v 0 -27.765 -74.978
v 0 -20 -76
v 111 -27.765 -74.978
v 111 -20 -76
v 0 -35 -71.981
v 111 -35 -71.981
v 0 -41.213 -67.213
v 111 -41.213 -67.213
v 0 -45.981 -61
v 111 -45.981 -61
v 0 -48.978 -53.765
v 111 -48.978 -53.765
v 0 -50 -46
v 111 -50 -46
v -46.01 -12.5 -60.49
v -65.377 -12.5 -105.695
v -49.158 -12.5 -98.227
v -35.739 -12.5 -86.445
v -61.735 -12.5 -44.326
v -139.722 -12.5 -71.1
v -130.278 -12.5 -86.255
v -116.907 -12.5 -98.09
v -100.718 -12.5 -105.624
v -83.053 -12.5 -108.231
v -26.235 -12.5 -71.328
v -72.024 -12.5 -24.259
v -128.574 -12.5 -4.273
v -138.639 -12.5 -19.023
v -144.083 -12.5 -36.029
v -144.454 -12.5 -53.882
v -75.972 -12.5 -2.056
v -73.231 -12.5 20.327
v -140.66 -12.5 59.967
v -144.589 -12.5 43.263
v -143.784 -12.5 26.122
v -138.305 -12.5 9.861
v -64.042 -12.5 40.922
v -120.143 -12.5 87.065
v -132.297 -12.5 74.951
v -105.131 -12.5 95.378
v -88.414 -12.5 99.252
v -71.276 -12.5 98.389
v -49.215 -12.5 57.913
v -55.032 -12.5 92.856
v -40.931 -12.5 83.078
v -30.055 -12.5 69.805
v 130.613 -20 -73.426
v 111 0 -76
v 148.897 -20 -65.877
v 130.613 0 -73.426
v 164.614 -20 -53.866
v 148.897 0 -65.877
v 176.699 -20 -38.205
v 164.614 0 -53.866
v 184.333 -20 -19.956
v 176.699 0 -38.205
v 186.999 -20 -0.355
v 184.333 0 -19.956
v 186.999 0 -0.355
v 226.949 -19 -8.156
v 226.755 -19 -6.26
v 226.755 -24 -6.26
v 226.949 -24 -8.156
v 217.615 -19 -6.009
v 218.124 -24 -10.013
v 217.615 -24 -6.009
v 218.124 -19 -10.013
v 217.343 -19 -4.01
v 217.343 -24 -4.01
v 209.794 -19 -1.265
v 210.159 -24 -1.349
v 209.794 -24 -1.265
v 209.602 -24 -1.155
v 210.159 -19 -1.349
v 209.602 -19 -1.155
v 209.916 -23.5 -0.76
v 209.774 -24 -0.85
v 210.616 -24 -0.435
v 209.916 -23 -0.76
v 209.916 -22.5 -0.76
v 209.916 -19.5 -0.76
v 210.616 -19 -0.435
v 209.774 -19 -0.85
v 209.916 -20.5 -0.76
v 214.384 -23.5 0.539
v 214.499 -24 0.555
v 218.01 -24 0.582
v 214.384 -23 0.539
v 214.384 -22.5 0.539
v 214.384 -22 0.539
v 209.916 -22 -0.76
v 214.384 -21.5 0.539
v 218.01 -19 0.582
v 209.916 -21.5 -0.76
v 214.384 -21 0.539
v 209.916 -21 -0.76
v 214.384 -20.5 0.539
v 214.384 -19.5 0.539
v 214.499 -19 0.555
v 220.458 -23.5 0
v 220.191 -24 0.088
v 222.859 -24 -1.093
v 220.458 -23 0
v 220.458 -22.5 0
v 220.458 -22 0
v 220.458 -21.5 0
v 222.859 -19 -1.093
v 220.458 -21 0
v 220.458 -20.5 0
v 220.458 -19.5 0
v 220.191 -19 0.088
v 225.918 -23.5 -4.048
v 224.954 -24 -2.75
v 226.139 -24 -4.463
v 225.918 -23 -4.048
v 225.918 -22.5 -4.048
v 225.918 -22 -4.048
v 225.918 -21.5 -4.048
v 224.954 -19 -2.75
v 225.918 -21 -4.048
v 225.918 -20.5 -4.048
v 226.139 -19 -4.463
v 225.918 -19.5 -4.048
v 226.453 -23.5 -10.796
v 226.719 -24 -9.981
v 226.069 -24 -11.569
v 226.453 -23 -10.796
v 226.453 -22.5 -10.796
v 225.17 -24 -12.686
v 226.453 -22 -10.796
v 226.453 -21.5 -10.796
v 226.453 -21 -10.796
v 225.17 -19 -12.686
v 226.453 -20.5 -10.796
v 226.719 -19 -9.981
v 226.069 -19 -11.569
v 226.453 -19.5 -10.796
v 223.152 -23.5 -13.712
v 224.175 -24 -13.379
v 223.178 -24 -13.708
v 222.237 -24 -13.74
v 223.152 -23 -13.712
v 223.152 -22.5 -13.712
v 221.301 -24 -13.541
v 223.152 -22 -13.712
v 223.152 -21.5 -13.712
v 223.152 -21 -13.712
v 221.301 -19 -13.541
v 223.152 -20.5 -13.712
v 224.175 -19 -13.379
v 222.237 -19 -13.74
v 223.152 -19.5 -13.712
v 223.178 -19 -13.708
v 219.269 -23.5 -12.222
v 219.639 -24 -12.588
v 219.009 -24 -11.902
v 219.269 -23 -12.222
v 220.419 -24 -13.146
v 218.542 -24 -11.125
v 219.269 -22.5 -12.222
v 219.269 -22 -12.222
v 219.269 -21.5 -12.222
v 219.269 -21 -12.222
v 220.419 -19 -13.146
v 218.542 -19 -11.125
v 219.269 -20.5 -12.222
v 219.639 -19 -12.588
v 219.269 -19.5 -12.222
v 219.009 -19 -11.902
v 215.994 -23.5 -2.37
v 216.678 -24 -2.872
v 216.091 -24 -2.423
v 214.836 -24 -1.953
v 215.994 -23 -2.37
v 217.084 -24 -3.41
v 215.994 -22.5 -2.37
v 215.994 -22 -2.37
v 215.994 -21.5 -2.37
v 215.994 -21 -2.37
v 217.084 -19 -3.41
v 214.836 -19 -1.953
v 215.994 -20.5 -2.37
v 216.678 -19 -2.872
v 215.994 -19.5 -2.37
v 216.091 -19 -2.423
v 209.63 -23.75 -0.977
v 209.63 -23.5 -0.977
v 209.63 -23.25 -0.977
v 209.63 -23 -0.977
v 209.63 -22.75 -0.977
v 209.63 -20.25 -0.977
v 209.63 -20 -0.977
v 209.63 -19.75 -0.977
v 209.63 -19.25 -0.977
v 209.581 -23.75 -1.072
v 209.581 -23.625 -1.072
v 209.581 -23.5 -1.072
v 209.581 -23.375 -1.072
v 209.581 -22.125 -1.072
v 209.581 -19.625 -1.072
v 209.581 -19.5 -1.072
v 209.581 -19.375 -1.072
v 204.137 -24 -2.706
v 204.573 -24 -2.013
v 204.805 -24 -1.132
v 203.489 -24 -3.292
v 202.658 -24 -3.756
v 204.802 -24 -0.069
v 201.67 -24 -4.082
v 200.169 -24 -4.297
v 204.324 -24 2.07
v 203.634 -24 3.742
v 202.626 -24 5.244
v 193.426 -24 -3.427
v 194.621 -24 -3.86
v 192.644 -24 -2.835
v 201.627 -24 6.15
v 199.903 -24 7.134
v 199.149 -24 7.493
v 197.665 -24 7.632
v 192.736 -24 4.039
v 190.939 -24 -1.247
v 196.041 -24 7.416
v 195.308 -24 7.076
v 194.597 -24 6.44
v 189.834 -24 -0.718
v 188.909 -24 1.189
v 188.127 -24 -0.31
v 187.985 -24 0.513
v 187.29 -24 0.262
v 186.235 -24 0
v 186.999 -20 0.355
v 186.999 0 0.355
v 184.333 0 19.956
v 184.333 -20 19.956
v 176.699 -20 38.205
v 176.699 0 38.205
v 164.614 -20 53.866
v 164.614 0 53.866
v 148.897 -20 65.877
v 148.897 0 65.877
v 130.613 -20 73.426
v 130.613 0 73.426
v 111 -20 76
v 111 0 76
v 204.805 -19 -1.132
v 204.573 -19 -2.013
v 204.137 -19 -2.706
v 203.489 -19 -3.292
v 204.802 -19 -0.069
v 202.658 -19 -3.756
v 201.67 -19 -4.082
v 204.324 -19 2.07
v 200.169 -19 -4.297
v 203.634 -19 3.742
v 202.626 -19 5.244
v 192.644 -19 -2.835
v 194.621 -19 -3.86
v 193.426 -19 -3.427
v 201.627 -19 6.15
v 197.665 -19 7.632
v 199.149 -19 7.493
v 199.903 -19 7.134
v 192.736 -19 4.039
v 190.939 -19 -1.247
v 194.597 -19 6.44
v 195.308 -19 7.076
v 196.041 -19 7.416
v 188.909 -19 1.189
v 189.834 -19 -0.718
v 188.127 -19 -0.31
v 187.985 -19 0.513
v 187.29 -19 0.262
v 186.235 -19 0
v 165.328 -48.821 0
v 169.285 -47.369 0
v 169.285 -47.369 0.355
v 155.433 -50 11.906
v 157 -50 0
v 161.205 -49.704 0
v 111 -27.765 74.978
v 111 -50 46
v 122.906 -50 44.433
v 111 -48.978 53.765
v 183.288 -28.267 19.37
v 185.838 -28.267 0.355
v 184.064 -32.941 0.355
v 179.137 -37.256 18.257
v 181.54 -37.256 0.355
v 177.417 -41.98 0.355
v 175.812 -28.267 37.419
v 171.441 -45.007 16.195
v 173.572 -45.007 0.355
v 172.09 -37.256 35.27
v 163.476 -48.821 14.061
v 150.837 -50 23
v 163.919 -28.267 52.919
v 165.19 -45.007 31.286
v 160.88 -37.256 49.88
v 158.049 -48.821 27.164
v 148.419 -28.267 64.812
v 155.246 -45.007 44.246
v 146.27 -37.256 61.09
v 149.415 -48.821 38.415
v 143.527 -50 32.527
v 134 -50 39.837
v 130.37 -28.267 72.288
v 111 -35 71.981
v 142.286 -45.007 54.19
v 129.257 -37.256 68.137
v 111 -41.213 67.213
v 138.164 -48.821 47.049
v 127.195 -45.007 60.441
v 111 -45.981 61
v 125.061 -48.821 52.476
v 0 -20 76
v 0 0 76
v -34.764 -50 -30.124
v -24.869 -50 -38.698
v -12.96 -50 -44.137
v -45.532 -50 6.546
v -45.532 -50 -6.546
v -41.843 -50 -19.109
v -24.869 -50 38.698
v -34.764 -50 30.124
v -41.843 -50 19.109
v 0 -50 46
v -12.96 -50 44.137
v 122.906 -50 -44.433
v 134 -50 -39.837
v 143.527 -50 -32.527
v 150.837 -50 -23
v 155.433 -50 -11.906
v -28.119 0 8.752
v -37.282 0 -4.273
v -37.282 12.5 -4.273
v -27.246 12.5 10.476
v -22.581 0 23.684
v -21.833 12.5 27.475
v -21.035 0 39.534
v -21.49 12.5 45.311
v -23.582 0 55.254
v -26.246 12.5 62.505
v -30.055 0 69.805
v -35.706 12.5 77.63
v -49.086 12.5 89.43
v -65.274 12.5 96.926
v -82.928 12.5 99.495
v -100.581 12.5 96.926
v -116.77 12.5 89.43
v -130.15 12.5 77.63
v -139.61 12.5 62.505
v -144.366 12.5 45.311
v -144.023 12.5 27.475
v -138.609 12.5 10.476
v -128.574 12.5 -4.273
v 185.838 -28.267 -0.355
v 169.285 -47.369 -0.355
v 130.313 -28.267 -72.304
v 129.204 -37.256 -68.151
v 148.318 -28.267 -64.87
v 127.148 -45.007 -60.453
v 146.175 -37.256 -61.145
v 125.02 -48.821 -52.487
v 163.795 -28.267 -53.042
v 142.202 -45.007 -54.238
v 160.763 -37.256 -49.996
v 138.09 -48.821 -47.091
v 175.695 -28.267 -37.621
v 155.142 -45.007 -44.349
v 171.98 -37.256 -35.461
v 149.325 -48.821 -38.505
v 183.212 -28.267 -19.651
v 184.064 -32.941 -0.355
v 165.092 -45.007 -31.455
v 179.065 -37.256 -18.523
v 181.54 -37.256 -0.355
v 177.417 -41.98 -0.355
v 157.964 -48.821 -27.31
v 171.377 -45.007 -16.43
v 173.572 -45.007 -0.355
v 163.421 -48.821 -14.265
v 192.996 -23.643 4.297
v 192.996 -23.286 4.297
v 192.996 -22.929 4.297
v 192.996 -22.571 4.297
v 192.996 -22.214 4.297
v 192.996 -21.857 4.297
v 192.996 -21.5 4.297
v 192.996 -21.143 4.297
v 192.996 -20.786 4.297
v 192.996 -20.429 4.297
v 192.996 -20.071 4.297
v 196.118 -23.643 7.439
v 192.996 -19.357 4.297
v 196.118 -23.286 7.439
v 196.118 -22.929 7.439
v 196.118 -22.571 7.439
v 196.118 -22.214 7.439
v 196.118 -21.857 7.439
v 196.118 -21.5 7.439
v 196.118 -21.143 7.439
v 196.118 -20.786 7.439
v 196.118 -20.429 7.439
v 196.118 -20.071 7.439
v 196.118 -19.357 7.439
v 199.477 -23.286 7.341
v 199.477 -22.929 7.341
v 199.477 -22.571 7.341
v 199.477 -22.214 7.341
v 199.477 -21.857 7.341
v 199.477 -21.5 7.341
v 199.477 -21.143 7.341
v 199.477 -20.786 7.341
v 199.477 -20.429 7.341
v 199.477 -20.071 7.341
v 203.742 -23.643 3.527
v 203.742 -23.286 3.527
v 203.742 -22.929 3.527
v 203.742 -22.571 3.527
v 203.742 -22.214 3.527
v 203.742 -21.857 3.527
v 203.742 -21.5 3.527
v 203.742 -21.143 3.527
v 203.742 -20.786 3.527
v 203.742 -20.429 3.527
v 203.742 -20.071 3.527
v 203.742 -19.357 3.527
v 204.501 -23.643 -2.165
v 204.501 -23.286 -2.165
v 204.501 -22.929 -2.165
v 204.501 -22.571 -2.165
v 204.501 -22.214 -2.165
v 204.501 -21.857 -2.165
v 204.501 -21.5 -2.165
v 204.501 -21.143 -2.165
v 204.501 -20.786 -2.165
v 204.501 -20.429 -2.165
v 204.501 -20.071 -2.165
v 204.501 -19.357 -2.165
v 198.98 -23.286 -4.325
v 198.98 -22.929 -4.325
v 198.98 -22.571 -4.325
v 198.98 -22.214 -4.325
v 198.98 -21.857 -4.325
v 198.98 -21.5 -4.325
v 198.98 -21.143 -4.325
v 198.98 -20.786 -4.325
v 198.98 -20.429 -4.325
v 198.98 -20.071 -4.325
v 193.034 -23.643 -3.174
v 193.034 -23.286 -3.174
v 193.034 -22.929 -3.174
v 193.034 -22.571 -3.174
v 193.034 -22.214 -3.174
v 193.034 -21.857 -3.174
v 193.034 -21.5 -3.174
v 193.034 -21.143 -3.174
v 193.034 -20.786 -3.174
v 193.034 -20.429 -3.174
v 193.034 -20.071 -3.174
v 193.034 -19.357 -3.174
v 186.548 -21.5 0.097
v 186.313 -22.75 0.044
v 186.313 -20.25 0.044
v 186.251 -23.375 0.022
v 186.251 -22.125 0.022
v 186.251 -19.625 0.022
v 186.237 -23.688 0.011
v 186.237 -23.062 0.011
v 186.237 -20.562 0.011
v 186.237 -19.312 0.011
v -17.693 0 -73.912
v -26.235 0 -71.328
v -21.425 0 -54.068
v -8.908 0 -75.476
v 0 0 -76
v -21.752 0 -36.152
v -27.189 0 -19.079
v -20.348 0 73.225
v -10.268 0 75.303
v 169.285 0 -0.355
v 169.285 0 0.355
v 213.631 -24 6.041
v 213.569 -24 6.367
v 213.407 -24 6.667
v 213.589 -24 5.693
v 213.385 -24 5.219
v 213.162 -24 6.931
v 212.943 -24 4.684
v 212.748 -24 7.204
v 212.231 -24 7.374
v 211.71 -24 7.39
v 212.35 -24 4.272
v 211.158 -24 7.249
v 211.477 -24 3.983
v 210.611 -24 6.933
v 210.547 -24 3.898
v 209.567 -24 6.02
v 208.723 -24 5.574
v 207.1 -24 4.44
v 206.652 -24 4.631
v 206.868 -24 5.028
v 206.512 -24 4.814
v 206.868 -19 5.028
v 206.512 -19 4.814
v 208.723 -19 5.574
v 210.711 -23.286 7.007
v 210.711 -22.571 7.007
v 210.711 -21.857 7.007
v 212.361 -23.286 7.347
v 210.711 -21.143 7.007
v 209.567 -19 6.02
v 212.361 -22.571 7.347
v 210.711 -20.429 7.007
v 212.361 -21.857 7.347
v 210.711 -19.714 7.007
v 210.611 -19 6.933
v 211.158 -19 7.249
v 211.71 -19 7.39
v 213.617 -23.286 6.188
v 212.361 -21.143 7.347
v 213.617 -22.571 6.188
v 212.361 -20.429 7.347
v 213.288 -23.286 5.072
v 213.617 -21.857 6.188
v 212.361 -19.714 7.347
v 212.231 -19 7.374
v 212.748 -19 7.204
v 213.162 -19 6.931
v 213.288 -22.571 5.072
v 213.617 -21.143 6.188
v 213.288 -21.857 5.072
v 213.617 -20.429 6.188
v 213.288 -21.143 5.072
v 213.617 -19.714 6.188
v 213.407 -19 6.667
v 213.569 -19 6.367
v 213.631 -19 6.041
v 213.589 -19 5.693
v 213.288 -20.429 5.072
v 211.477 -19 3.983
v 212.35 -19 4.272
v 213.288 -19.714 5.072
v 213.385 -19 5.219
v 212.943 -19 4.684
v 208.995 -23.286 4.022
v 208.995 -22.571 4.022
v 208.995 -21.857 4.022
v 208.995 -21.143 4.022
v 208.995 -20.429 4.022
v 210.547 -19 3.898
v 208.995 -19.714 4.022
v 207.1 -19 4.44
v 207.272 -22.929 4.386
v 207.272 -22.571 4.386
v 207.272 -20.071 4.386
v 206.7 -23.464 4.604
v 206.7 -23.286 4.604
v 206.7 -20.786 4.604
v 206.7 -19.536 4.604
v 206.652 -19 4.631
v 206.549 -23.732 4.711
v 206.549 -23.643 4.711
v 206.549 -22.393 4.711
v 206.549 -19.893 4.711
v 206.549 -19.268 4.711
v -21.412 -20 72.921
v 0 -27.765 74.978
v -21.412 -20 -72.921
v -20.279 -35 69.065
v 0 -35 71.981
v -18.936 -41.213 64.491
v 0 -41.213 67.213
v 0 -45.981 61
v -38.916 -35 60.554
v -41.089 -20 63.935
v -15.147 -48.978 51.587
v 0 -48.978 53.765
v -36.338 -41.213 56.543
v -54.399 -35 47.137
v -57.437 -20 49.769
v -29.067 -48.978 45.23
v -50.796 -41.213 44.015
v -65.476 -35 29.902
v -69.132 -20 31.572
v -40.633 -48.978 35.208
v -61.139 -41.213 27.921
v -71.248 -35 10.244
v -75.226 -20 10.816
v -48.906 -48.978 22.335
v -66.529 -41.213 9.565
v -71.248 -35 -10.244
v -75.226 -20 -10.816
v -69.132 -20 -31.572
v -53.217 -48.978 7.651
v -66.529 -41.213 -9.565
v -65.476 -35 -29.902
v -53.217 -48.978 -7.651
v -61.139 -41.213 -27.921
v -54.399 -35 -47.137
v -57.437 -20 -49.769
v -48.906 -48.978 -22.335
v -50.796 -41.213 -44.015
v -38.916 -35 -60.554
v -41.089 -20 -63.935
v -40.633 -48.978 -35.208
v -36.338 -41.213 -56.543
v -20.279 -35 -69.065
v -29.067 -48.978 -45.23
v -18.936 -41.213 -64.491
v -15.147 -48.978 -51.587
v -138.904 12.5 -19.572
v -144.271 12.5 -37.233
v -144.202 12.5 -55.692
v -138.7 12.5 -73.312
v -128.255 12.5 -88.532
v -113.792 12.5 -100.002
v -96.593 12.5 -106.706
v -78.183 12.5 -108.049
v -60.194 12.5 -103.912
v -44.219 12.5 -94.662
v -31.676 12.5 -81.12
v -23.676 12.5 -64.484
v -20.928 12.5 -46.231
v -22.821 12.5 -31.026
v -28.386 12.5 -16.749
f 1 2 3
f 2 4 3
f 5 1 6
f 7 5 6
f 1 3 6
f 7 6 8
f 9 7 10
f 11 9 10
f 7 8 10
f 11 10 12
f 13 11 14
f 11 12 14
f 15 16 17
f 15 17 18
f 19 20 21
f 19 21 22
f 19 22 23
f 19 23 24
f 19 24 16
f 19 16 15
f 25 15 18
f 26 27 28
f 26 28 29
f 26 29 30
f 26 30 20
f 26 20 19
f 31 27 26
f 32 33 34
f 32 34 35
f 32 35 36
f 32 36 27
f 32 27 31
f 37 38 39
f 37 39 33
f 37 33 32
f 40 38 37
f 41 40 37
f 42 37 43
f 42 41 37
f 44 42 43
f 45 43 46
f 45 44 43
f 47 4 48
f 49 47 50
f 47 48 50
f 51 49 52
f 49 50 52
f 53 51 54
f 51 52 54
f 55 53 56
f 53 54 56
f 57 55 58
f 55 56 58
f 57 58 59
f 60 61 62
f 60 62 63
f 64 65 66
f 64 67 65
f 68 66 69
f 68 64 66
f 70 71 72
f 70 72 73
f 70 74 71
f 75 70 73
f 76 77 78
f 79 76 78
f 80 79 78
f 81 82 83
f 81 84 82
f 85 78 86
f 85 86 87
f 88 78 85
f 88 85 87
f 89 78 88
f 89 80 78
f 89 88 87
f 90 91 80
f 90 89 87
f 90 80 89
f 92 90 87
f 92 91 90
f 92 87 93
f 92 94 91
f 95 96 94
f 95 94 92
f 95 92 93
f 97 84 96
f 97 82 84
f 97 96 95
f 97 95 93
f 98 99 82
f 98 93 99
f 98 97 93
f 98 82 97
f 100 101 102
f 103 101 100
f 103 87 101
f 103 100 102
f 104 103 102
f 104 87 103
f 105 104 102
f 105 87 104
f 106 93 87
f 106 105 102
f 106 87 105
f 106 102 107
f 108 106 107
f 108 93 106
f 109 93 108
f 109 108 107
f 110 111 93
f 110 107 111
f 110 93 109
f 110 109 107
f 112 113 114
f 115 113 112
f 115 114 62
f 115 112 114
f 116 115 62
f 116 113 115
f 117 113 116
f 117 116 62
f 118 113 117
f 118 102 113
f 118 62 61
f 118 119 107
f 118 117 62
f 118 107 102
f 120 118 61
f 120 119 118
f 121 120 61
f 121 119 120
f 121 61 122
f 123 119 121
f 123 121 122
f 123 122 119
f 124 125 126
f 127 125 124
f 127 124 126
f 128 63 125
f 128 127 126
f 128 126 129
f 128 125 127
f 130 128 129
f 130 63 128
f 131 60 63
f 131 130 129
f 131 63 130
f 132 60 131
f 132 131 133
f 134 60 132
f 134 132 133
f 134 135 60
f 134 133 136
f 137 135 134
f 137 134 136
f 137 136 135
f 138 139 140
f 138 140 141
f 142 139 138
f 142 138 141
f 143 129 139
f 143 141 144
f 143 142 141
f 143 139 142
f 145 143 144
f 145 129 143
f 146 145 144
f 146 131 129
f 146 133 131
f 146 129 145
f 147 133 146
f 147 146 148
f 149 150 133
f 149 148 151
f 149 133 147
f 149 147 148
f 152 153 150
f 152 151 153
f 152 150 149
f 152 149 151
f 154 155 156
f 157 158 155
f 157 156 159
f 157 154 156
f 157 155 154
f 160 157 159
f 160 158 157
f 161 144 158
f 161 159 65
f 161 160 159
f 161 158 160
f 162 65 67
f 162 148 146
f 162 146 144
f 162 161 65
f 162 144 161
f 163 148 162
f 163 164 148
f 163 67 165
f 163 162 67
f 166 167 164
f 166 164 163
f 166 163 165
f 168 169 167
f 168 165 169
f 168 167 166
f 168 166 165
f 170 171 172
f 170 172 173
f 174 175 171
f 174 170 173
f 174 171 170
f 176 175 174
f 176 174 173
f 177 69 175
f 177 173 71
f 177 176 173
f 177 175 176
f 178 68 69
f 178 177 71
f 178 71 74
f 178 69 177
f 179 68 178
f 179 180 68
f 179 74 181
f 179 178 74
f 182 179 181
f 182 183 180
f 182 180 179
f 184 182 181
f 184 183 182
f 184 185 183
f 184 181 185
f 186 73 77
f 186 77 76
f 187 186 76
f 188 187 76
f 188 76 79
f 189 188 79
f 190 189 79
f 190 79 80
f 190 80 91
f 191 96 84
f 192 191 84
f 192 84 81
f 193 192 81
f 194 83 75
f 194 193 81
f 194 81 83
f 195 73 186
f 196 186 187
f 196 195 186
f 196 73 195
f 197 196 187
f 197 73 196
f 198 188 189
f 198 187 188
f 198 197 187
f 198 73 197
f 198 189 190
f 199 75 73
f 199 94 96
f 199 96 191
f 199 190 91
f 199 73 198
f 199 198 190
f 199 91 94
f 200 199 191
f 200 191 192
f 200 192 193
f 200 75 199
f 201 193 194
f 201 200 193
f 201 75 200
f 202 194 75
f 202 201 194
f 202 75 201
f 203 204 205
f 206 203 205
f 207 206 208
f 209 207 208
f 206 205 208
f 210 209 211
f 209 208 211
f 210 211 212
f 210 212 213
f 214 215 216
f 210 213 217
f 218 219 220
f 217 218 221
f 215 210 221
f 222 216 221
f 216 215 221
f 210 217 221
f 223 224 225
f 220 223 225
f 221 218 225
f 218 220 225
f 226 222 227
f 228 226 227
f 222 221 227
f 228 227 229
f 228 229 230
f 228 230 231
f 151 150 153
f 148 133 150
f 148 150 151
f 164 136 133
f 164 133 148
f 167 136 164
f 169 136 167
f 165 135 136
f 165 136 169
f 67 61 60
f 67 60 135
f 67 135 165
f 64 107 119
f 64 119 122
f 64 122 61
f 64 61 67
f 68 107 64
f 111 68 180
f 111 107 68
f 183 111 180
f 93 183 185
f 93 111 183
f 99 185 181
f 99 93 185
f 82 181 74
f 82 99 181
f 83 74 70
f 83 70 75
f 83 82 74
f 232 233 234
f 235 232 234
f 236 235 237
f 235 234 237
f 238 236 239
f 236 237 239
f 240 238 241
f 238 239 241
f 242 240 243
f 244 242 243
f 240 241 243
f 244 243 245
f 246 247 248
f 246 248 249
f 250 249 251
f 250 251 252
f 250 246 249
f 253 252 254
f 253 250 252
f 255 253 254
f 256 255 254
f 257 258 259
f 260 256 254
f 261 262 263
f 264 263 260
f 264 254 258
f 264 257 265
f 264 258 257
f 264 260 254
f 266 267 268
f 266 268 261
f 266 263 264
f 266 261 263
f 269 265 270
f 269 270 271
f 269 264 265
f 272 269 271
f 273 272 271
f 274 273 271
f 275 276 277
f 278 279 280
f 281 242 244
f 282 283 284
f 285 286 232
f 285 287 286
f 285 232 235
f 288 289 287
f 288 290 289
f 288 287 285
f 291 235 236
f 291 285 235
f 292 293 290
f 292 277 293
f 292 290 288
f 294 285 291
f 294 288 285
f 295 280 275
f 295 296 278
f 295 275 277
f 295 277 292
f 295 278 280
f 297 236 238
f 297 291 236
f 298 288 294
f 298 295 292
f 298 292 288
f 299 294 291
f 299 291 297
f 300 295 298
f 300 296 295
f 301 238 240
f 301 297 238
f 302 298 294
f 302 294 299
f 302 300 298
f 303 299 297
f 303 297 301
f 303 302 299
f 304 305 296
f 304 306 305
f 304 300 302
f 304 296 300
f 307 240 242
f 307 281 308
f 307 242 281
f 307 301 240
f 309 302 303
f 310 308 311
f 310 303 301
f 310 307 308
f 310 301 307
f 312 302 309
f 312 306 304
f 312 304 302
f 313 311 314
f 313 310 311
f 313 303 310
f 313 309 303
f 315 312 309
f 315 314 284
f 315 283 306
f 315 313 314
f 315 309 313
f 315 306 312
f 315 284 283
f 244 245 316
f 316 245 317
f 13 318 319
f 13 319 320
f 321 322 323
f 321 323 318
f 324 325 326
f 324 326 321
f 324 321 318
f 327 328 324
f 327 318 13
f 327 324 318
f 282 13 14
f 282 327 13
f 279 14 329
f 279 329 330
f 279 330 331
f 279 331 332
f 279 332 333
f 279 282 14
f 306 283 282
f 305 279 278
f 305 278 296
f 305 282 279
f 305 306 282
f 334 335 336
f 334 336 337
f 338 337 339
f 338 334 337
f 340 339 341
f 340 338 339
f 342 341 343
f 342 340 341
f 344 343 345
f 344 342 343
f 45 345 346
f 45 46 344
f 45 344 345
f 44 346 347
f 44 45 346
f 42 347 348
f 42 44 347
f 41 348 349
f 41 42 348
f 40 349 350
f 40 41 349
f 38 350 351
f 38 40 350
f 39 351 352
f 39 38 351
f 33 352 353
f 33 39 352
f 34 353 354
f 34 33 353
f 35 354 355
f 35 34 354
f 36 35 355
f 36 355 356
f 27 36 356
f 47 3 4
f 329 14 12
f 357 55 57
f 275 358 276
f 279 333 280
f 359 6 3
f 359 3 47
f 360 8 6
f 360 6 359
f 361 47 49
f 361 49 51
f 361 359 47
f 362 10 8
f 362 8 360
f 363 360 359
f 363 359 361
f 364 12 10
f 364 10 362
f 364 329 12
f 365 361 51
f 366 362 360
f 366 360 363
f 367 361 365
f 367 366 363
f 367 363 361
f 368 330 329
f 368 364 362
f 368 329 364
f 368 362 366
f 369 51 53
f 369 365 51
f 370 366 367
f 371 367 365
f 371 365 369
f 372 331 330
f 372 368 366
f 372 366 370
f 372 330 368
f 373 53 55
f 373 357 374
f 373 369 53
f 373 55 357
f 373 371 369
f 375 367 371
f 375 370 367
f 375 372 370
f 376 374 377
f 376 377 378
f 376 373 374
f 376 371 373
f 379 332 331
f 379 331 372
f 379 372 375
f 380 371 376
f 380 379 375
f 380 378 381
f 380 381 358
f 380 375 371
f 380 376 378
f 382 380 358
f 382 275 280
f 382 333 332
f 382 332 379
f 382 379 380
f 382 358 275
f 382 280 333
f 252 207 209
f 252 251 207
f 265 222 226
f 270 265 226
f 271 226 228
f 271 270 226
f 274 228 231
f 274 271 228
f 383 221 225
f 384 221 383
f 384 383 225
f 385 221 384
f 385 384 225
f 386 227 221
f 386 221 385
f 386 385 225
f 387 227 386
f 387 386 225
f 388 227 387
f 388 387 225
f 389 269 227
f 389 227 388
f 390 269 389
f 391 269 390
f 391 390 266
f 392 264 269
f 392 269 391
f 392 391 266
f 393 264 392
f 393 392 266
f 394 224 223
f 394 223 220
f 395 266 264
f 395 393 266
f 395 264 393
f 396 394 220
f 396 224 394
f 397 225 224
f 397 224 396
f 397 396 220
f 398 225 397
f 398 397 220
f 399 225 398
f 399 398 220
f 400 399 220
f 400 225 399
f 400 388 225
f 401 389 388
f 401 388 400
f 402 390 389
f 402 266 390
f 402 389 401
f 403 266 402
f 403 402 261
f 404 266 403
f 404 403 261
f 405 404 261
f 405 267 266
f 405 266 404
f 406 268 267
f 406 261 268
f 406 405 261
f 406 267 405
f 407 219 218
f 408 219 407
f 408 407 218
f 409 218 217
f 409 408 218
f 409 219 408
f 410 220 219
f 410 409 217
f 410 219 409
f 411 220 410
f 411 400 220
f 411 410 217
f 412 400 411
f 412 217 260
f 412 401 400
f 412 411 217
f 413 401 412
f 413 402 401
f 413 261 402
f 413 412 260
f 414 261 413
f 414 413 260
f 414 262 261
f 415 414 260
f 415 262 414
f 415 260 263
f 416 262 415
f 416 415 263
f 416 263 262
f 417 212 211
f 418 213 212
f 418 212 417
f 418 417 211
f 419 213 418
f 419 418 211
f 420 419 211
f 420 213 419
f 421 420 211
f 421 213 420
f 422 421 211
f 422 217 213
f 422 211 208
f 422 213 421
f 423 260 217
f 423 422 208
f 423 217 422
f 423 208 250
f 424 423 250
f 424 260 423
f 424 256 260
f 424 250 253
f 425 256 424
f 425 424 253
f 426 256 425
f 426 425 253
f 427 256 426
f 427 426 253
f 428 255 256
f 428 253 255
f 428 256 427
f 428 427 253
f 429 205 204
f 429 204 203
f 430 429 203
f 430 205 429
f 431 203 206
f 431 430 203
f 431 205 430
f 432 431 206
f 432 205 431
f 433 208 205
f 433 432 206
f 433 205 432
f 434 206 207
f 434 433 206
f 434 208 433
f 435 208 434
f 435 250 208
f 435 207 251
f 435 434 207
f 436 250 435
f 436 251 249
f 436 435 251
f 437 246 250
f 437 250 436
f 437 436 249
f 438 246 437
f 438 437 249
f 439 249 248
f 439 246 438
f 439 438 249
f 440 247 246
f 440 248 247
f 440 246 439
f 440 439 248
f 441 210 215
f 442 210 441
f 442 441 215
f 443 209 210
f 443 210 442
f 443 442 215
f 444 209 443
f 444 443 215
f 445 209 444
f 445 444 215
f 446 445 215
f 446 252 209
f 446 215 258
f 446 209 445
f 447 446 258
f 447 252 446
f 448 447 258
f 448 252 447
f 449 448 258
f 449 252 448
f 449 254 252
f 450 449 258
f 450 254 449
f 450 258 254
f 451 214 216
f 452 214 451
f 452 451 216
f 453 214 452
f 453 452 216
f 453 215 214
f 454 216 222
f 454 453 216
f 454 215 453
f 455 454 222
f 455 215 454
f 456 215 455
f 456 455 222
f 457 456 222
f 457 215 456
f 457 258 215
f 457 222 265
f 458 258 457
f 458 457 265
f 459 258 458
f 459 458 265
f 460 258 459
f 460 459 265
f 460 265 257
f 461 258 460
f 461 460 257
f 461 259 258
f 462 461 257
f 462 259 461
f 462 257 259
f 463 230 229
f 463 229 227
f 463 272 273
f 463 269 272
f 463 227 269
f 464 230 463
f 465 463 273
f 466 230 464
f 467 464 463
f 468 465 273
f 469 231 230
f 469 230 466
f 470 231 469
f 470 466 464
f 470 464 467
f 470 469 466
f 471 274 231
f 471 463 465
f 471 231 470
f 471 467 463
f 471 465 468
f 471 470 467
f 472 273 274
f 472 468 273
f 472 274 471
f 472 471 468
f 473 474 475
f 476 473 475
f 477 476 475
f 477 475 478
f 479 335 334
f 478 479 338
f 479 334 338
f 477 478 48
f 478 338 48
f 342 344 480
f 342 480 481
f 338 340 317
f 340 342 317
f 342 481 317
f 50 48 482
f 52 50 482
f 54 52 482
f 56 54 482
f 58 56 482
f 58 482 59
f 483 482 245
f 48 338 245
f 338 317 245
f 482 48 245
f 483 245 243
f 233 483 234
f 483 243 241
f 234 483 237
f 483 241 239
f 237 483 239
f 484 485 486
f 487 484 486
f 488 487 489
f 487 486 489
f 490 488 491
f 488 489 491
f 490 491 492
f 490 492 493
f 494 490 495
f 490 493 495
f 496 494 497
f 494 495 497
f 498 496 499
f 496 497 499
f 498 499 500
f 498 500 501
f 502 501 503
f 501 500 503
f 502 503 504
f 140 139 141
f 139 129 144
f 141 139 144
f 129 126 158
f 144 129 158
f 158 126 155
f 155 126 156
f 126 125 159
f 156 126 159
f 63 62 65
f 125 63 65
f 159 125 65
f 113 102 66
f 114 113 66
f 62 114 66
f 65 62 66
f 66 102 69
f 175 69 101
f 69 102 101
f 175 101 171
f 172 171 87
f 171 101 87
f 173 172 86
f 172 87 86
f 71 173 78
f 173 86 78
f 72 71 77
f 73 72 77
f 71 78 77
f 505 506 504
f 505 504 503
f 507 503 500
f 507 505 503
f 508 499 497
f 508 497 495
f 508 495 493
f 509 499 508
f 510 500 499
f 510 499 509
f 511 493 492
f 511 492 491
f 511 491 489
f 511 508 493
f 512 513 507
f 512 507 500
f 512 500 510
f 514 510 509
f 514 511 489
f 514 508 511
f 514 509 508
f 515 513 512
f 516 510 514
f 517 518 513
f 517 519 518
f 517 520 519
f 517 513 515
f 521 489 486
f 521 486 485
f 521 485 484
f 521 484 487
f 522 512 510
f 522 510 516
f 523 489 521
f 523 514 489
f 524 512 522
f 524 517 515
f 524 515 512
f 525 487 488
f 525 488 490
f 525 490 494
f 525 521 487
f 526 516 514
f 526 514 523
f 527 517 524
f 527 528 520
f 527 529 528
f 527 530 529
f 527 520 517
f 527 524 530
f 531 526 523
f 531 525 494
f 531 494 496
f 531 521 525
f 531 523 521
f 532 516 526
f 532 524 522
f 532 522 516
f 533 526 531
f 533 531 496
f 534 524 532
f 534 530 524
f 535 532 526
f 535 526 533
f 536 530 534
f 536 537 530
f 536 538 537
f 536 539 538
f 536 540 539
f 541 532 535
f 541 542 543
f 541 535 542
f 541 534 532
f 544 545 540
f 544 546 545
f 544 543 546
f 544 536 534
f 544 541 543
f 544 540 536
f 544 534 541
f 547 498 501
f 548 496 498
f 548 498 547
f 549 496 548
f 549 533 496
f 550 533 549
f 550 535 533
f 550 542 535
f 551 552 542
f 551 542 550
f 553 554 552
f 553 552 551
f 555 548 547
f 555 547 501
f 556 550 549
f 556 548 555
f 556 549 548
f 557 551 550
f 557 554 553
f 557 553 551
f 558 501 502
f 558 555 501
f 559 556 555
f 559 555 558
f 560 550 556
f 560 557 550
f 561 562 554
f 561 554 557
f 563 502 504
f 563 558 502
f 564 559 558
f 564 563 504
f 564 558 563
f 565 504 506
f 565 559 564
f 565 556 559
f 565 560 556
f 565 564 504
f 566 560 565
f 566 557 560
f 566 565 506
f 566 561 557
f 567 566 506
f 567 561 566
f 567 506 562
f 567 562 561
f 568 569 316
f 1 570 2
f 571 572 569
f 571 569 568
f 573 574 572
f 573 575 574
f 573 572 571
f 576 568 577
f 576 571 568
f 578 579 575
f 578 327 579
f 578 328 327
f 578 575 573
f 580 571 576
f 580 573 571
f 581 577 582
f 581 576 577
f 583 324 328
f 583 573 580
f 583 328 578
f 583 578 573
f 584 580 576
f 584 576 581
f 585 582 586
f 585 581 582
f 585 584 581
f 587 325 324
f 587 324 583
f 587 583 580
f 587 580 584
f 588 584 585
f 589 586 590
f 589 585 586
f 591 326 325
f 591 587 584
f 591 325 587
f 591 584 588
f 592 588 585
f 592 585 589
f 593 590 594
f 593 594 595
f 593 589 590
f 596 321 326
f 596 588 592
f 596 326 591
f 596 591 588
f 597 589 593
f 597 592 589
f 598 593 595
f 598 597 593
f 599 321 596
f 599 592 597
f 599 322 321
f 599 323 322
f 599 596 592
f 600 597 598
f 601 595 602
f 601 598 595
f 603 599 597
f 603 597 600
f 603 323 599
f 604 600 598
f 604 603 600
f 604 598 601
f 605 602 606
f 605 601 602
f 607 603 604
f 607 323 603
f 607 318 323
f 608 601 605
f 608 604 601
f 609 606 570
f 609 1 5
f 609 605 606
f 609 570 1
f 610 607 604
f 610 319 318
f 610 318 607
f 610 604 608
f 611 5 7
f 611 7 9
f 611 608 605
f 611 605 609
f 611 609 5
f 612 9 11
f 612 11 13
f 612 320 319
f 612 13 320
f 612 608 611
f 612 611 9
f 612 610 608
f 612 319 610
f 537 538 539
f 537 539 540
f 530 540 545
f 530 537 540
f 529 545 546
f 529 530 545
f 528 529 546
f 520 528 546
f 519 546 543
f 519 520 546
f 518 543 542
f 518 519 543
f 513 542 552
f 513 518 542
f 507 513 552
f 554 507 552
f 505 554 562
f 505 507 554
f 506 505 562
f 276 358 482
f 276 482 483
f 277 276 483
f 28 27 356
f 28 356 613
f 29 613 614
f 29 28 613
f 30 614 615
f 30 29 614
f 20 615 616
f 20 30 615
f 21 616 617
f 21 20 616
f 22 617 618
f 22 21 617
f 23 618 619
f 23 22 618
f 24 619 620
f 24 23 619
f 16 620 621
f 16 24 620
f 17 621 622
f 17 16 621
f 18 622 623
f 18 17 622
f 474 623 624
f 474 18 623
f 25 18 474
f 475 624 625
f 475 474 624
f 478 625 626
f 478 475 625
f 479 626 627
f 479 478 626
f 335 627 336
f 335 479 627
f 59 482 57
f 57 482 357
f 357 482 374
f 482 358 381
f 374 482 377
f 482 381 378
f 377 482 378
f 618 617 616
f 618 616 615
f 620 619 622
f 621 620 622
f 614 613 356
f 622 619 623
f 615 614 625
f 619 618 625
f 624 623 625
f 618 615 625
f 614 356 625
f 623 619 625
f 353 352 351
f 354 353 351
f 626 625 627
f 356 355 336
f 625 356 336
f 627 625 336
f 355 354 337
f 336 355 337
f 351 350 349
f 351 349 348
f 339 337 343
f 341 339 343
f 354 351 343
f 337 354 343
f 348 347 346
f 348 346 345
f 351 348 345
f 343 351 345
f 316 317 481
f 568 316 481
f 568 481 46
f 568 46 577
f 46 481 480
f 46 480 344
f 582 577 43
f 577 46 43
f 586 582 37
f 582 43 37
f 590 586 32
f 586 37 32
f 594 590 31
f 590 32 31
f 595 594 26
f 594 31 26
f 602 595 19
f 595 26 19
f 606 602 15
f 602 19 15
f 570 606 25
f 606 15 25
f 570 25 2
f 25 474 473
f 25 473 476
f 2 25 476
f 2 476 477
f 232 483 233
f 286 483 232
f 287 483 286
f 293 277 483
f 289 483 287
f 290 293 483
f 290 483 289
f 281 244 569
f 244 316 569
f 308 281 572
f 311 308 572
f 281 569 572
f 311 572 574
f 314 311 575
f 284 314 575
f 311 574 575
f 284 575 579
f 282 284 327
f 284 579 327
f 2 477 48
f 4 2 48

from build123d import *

# Parameters (mm, degrees)
F2_DEPTH = 50
F4_DEPTH = 12.5
F5_R     = 30
F6_W     = 18.3814466
F6_H     = 0.7109052385
F7_DEPTH = 62.501
F9_DEPTH = 5


with BuildPart() as f2:
    # F0 (on Front) → F2 (new body)
    with BuildSketch(Plane.XZ):
        with BuildLine():
            ThreePointArc((55.5, 51.9206124771), (30.2492433933, 69.7207521053), (0, 76))
            ThreePointArc((0, 76), (-76, 0), (0, -76))
            ThreePointArc((0, -76), (30.2492433933, -69.7207521053), (55.5, -51.9206124771))
            ThreePointArc((55.5, -51.9206124771), (35, 0), (55.5, 51.9206124771))
        make_face()
        with BuildLine():
            ThreePointArc((111, 76), (80.7507566067, 69.7207521053), (55.5, 51.9206124771))
            ThreePointArc((55.5, 51.9206124771), (70.6894617323, 27.9105714739), (76, 0))
            ThreePointArc((76, 0), (70.6894617323, -27.9105714739), (55.5, -51.9206124771))
            ThreePointArc((55.5, -51.9206124771), (80.7507566067, -69.7207521053), (111, -76))
            ThreePointArc((111, -76), (164.7401153702, -53.7401153702), (187, 0))
            ThreePointArc((187, 0), (164.7401153702, 53.7401153702), (111, 76))
        make_face()
        with BuildLine():
            ThreePointArc((76, 0), (70.6894617323, 27.9105714739), (55.5, 51.9206124771))
            ThreePointArc((55.5, 51.9206124771), (35, 0), (55.5, -51.9206124771))
            ThreePointArc((55.5, -51.9206124771), (70.6894617323, -27.9105714739), (76, 0))
        make_face()
        with BuildLine():
            ThreePointArc((55.5, -51.9206124771), (30.2492433933, -69.7207521053), (0, -76))
            Line((0, -76), (111, -76))
            ThreePointArc((111, -76), (80.7507566067, -69.7207521053), (55.5, -51.9206124771))
        make_face()
        with BuildLine():
            Line((111, 76), (0, 76))
            ThreePointArc((0, 76), (30.2492433933, 69.7207521053), (55.5, 51.9206124771))
            ThreePointArc((55.5, 51.9206124771), (80.7507566067, 69.7207521053), (111, 76))
        make_face()
    extrude(amount=F2_DEPTH)

    # F3 (on Front) → F4 (join, symmetric)
    with BuildSketch(Plane.XZ):
        with BuildLine():
            ThreePointArc((-37.2815726812, -4.2733152497), (-25.2166728338, 15.1217985527), (-21.0039791425, 37.5714190304))
            ThreePointArc((-21.0039791425, 37.5714190304), (-105.3774286433, 95.2825543621), (-128.5740436499, -4.2733152497))
            ThreePointArc((-128.5740436499, -4.2733152497), (-82.9278081656, 15.7693113089), (-37.2815726812, -4.2733152497))
        make_face()
        with BuildLine():
            ThreePointArc((-37.2815726812, -4.2733152497), (-82.9278081656, 15.7693113089), (-128.5740436499, -4.2733152497))
            ThreePointArc((-128.5740436499, -4.2733152497), (-82.9278081656, -24.3524099926), (-37.2815726812, -4.2733152497))
        make_face()
        with BuildLine():
            ThreePointArc((-37.2815726812, -4.2733152497), (-82.9278081656, -24.3524099926), (-128.5740436499, -4.2733152497))
            ThreePointArc((-128.5740436499, -4.2733152497), (-105.443729199, -103.9977493747), (-20.9278081656, -46.2306886911))
            ThreePointArc((-20.9278081656, -46.2306886911), (-25.160747482, -23.7147676577), (-37.2815726812, -4.2733152497))
        make_face()
    extrude(amount=F4_DEPTH, both=True)

    # F5
    f5_edges = [f2.edges().sort_by_distance(p)[0] for p in [
        (-76, -50, 0),
    ]]
    fillet(f5_edges, radius=F5_R)

    # F6 (on face) → F7 (cut, through all)
    with BuildSketch(Plane.XZ.offset(50)):
        with Locations((178.4760802984, 0)):
            Rectangle(F6_W, F6_H)
    extrude(amount=-F7_DEPTH, mode=Mode.SUBTRACT)


with BuildPart() as f9:
    # F8 (on offset) → F9 (new body)
    with BuildSketch(Plane.XZ.offset(19)):
        with BuildLine():
            add(Edge.make_bspline(
                [(186.2353235483, 0), (186.2044547177, 0.0747911149), (188.300233226, 0.2494545876), (189.6482831856, 2.2797572105), (193.4409479742, 3.9003962391), (194.8624348442, 8.0073175867), (199.2328967978, 7.5651171233), (199.4291318595, 7.3008771556), (202.874390791, 5.9546585675), (204.8134458048, 1.2419933071), (205.0257982249, -2.4046181354), (201.7339024152, -4.6171954825), (196.1737072863, -4.1900667093), (192.7361364962, -3.5673430279), (191.0633411793, -0.3373509327), (186.2843874562, -0.1188753932), (186.2353235483, 0)],
                knots=[0, 0, 0, 0, 0.050794177, 0.1149212878, 0.1933829982, 0.2728438513, 0.3475405453, 0.3711307562, 0.4420088406, 0.5327126918, 0.6047221035, 0.6778533767, 0.7719603796, 0.8436183932, 0.9192661084, 1, 1, 1, 1], degree=3))
        make_face()
    extrude(amount=F9_DEPTH)


with BuildPart() as f9b:
    # F8 (on offset) → F9, piece 2 (new body)
    with BuildSketch(Plane.XZ.offset(19)):
        with BuildLine():
            add(Edge.make_bspline(
                [(209.602072835, -1.1549931951), (209.3292691552, -0.7927123319), (214.4345773804, 1.0295634406), (220.4437596795, 0.5749949714), (226.9075024996, -3.3329207005), (227.401233462, -11.0387557491), (223.2432169573, -14.6067805636), (218.7680861026, -12.6100443573), (217.7391292396, -8.8005006064), (217.6264051934, -5.9155625885), (217.3056110412, -1.2058594552), (209.9383492923, -1.6015653431), (209.602072835, -1.1549931951)],
                knots=[0, 0, 0, 0, 0.093238953, 0.2114185799, 0.329005134, 0.4461217063, 0.5416516708, 0.6325090369, 0.7187012775, 0.7970382991, 0.8850672952, 1, 1, 1, 1], degree=3))
        make_face()
    extrude(amount=F9_DEPTH)


with BuildPart() as f9c:
    # F8 (on offset) → F9, piece 3 (new body)
    with BuildSketch(Plane.XZ.offset(19)):
        with BuildLine():
            add(Edge.make_bspline(
                [(206.5117806196, 4.8142769374), (206.5822881024, 5.0811938009), (209.4327518341, 5.4345017137), (210.4997655977, 7.1437609229), (212.367137802, 7.6564093645), (214.158969439, 6.2477702854), (212.6146639333, 3.8412251138), (209.353672071, 3.7956908767), (206.4416112252, 4.5486399591), (206.5117806196, 4.8142769374)],
                knots=[0, 0, 0, 0, 0.1523127077, 0.2905024212, 0.411958959, 0.5350974972, 0.6706383582, 0.8484176425, 1, 1, 1, 1], degree=3))
        make_face()
    extrude(amount=F9_DEPTH)


solid = Compound([f2.part, f9.part, f9b.part, f9c.part])
